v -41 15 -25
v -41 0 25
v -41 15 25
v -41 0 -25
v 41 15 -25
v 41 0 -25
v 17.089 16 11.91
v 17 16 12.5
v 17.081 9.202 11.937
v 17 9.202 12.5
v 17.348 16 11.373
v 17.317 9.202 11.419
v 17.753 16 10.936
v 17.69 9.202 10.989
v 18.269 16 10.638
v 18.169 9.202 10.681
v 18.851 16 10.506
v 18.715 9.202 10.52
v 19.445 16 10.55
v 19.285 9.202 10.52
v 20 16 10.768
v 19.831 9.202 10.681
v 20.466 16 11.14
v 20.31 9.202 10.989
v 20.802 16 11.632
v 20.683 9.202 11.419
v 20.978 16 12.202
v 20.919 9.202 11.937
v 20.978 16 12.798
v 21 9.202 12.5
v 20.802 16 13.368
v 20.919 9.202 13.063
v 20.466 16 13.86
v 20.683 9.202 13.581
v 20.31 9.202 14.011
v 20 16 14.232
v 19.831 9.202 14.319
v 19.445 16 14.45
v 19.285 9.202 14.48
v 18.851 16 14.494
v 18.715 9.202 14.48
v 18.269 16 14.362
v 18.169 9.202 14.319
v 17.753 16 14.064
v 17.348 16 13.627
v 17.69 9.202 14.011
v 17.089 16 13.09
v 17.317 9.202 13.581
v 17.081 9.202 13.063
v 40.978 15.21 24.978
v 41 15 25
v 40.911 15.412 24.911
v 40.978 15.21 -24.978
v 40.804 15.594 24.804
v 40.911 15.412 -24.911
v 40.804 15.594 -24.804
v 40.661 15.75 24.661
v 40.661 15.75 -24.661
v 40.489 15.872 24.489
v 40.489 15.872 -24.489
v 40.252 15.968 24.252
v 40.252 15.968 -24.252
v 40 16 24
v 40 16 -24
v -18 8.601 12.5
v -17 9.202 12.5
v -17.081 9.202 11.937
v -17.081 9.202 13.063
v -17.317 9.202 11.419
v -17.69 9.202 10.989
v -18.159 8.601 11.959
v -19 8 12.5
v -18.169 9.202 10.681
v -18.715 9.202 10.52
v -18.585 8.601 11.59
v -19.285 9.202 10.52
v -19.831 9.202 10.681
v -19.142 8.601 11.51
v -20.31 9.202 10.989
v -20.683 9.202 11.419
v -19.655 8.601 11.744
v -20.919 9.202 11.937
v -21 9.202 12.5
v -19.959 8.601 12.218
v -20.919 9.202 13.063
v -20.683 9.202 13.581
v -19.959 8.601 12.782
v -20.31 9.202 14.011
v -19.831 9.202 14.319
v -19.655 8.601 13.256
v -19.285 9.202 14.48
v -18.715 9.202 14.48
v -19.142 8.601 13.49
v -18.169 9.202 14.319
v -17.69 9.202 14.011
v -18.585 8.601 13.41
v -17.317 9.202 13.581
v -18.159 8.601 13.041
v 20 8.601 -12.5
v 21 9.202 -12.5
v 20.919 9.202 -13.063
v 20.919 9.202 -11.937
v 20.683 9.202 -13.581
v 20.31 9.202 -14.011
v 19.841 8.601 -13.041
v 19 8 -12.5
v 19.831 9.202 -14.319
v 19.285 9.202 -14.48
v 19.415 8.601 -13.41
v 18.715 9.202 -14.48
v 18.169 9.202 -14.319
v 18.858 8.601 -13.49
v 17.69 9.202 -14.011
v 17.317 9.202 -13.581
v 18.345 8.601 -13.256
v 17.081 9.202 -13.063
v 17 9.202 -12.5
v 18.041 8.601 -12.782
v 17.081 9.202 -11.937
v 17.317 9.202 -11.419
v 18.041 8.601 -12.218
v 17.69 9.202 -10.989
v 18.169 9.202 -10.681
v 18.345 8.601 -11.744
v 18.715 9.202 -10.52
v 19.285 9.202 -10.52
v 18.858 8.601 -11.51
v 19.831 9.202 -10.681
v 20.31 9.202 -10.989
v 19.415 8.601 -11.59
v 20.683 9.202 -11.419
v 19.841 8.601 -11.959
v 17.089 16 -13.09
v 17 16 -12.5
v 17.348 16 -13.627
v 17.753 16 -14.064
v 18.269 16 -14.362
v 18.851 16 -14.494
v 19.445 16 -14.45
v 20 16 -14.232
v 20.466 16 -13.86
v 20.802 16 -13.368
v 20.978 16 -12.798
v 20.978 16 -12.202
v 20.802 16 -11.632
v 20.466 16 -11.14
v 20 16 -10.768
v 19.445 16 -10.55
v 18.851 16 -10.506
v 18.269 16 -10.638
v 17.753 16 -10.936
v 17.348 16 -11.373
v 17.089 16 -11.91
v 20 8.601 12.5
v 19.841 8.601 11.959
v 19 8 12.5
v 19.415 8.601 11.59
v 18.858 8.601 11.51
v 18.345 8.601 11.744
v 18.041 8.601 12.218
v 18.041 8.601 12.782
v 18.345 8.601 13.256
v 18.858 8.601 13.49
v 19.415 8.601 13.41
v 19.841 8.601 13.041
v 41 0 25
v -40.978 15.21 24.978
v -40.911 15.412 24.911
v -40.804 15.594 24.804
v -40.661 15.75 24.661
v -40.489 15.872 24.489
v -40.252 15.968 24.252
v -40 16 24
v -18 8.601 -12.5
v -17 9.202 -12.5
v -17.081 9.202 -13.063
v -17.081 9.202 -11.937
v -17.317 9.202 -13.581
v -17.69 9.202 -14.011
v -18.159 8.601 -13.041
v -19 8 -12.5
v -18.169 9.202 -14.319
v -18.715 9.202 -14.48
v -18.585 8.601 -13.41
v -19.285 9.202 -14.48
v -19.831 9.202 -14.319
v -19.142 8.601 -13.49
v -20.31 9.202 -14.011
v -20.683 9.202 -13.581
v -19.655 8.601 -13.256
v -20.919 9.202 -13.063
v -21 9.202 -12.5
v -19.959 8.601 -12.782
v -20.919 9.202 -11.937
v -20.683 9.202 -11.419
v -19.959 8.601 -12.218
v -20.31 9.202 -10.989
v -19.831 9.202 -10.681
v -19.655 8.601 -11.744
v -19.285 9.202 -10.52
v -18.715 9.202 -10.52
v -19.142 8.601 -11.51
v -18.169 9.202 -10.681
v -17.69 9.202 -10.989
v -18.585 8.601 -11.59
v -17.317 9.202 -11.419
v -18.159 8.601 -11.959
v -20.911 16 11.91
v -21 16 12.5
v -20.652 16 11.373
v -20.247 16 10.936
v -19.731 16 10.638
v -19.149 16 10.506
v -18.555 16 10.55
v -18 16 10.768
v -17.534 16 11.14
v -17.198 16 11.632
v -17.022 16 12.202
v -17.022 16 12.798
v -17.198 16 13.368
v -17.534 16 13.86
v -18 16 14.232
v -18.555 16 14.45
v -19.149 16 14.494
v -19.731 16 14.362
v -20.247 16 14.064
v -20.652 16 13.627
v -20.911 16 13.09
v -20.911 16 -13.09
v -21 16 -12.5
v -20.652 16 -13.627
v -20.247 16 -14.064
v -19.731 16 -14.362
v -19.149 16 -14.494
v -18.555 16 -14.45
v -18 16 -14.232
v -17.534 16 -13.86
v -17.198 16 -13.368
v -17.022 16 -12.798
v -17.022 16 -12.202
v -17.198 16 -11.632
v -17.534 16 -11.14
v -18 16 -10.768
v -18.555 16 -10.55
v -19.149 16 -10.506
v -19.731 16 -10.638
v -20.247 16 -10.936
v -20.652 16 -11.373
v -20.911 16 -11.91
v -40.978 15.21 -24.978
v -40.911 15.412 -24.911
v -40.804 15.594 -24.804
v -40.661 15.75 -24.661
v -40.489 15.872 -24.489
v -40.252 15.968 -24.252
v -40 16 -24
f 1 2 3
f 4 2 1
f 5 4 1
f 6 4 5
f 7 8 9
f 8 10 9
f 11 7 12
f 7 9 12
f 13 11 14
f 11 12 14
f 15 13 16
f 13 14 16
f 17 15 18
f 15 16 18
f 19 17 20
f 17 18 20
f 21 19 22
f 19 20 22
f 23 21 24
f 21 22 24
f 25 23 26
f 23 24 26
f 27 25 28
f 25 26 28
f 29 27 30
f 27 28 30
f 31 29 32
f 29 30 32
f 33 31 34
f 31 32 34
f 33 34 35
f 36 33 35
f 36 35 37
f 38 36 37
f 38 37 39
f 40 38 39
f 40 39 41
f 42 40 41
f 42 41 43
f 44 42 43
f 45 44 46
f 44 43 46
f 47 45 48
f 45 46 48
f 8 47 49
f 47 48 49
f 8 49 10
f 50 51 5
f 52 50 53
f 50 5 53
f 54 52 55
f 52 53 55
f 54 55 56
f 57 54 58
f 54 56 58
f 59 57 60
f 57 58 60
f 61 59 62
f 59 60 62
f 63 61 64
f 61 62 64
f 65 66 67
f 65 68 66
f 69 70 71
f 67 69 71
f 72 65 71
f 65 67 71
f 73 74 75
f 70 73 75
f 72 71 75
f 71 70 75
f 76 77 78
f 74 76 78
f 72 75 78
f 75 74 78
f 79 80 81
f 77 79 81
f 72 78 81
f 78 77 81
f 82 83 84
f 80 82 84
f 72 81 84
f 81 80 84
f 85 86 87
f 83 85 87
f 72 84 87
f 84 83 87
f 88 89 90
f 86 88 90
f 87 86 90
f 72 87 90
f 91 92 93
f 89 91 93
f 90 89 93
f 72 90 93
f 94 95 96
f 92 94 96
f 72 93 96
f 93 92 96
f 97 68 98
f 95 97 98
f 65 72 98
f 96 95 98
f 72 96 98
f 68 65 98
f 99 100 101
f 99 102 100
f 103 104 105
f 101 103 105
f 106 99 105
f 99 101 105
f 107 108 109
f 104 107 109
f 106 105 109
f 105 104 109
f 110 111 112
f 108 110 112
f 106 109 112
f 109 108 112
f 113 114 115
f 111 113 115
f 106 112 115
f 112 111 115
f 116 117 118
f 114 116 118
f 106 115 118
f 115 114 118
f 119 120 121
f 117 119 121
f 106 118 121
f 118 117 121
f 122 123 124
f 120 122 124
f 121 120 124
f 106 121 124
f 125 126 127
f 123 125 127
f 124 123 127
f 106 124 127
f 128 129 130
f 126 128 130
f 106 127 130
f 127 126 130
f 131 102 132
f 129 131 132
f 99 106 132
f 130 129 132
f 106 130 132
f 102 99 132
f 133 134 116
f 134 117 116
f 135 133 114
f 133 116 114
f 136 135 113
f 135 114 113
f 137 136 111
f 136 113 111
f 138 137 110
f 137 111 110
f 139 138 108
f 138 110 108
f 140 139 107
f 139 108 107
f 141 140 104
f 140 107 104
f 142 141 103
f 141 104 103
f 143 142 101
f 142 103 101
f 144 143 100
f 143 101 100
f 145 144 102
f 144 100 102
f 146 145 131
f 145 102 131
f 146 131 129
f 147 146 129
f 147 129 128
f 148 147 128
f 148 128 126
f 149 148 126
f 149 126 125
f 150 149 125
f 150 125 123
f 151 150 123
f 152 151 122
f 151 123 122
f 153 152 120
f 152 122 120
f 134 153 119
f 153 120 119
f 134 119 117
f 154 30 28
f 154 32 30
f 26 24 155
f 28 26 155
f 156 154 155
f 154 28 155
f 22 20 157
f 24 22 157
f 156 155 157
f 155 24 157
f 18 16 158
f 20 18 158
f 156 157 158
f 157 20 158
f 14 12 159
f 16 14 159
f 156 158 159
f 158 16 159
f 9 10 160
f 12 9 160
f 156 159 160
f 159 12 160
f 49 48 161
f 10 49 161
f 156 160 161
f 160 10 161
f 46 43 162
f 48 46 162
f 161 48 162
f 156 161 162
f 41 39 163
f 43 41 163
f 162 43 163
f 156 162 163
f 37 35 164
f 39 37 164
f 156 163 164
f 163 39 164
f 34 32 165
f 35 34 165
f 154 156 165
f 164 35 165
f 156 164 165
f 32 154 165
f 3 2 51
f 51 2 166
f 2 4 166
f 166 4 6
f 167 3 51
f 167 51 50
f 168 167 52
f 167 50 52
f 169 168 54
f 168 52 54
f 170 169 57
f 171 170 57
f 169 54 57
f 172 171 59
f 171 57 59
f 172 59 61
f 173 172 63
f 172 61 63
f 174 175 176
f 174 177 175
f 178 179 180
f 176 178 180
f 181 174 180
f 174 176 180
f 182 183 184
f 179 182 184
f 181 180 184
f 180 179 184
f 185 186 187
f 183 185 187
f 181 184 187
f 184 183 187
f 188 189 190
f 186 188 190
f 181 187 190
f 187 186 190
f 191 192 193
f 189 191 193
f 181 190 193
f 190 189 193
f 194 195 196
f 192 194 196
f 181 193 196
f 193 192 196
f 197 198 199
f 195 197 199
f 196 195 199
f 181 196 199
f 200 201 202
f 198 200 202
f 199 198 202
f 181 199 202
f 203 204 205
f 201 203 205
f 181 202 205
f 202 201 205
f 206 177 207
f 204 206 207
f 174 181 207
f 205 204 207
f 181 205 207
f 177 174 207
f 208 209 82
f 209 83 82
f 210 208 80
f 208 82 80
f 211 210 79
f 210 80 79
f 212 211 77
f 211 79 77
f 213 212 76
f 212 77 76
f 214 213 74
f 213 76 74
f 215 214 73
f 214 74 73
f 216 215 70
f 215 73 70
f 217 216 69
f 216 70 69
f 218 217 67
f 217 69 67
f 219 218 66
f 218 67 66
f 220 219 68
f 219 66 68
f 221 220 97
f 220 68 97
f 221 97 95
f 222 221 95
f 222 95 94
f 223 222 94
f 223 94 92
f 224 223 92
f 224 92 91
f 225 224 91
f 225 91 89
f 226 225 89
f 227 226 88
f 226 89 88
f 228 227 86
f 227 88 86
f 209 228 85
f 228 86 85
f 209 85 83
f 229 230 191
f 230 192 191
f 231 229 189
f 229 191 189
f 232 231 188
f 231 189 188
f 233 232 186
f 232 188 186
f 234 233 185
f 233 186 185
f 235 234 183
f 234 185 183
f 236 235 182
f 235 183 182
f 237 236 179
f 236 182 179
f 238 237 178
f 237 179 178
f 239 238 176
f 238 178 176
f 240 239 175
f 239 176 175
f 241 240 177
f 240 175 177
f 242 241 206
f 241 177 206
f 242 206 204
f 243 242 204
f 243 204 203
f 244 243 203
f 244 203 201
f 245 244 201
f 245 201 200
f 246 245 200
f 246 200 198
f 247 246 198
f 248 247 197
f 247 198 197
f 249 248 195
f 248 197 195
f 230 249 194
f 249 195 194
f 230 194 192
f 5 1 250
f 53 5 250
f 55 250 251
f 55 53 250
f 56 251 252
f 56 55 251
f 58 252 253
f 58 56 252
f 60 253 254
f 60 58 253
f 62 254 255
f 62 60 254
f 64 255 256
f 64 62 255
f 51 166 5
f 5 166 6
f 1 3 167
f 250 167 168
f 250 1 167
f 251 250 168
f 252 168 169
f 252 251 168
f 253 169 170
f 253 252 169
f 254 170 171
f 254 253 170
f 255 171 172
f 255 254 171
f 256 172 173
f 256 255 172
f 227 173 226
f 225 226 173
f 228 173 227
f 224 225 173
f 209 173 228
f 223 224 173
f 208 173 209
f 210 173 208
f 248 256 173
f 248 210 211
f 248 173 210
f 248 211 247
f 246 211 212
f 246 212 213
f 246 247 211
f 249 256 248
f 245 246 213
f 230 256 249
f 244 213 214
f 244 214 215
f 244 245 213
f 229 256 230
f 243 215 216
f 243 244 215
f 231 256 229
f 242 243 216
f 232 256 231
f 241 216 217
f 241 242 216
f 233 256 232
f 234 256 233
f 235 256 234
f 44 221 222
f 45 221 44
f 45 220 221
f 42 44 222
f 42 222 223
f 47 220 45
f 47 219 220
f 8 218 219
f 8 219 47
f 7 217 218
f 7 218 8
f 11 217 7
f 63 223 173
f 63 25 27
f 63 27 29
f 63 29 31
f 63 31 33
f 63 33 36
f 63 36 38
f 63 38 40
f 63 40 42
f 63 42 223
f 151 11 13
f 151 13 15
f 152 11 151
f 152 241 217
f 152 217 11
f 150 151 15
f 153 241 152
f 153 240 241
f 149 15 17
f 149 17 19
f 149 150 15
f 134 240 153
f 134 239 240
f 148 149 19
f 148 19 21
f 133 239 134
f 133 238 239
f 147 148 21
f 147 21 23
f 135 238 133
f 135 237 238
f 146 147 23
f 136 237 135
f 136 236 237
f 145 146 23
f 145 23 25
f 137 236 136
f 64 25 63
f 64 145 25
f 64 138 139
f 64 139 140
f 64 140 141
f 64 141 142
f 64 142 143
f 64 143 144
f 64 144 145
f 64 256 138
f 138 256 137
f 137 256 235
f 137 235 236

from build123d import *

# Parameters (mm, degrees)
SKETCH1_W                    = 82
SKETCH1_H                    = 50
BOSS_EXTRUDE1_DEPTH          = 16
FILLET1_R                    = 1
F_4_0_4_DIAMETER_HOLE3_D     = 4
F_4_0_4_DIAMETER_HOLE3_DEPTH = 6.798278762
F_4_0_4_DIAMETER_HOLE3_TIP   = 1.201721238


with BuildPart() as part:
    # Sketch1 → Boss-Extrude1 (new body)
    with BuildSketch(Plane(origin=(0, 0, 0), x_dir=(1, 0, 0), z_dir=(0, 1, 0))):
        Rectangle(SKETCH1_W, SKETCH1_H)
    extrude(amount=BOSS_EXTRUDE1_DEPTH)

    # Fillet1
    fillet1_edges = [part.edges().sort_by_distance(p)[0] for p in [
        (-41, 16, 0),
        (0, 16, 25),
        (41, 16, 0),
        (0, 16, -25),
    ]]
    fillet(fillet1_edges, radius=FILLET1_R)

    # Ø4.0 (4) Diameter Hole3
    with Locations(Plane(origin=(0, 16, 0), x_dir=(1, 0, 0), z_dir=(0, 1, 0))):
        with Locations((-19, 12.5), (19, 12.5), (19, -12.5), (-19, -12.5)):
            Hole(F_4_0_4_DIAMETER_HOLE3_D / 2, depth=F_4_0_4_DIAMETER_HOLE3_DEPTH)
            with Locations((0, 0, -(F_4_0_4_DIAMETER_HOLE3_DEPTH + F_4_0_4_DIAMETER_HOLE3_TIP / 2))):  # 118° drill point
                Cone(0, F_4_0_4_DIAMETER_HOLE3_D / 2, F_4_0_4_DIAMETER_HOLE3_TIP, mode=Mode.SUBTRACT)


solid = part.part
